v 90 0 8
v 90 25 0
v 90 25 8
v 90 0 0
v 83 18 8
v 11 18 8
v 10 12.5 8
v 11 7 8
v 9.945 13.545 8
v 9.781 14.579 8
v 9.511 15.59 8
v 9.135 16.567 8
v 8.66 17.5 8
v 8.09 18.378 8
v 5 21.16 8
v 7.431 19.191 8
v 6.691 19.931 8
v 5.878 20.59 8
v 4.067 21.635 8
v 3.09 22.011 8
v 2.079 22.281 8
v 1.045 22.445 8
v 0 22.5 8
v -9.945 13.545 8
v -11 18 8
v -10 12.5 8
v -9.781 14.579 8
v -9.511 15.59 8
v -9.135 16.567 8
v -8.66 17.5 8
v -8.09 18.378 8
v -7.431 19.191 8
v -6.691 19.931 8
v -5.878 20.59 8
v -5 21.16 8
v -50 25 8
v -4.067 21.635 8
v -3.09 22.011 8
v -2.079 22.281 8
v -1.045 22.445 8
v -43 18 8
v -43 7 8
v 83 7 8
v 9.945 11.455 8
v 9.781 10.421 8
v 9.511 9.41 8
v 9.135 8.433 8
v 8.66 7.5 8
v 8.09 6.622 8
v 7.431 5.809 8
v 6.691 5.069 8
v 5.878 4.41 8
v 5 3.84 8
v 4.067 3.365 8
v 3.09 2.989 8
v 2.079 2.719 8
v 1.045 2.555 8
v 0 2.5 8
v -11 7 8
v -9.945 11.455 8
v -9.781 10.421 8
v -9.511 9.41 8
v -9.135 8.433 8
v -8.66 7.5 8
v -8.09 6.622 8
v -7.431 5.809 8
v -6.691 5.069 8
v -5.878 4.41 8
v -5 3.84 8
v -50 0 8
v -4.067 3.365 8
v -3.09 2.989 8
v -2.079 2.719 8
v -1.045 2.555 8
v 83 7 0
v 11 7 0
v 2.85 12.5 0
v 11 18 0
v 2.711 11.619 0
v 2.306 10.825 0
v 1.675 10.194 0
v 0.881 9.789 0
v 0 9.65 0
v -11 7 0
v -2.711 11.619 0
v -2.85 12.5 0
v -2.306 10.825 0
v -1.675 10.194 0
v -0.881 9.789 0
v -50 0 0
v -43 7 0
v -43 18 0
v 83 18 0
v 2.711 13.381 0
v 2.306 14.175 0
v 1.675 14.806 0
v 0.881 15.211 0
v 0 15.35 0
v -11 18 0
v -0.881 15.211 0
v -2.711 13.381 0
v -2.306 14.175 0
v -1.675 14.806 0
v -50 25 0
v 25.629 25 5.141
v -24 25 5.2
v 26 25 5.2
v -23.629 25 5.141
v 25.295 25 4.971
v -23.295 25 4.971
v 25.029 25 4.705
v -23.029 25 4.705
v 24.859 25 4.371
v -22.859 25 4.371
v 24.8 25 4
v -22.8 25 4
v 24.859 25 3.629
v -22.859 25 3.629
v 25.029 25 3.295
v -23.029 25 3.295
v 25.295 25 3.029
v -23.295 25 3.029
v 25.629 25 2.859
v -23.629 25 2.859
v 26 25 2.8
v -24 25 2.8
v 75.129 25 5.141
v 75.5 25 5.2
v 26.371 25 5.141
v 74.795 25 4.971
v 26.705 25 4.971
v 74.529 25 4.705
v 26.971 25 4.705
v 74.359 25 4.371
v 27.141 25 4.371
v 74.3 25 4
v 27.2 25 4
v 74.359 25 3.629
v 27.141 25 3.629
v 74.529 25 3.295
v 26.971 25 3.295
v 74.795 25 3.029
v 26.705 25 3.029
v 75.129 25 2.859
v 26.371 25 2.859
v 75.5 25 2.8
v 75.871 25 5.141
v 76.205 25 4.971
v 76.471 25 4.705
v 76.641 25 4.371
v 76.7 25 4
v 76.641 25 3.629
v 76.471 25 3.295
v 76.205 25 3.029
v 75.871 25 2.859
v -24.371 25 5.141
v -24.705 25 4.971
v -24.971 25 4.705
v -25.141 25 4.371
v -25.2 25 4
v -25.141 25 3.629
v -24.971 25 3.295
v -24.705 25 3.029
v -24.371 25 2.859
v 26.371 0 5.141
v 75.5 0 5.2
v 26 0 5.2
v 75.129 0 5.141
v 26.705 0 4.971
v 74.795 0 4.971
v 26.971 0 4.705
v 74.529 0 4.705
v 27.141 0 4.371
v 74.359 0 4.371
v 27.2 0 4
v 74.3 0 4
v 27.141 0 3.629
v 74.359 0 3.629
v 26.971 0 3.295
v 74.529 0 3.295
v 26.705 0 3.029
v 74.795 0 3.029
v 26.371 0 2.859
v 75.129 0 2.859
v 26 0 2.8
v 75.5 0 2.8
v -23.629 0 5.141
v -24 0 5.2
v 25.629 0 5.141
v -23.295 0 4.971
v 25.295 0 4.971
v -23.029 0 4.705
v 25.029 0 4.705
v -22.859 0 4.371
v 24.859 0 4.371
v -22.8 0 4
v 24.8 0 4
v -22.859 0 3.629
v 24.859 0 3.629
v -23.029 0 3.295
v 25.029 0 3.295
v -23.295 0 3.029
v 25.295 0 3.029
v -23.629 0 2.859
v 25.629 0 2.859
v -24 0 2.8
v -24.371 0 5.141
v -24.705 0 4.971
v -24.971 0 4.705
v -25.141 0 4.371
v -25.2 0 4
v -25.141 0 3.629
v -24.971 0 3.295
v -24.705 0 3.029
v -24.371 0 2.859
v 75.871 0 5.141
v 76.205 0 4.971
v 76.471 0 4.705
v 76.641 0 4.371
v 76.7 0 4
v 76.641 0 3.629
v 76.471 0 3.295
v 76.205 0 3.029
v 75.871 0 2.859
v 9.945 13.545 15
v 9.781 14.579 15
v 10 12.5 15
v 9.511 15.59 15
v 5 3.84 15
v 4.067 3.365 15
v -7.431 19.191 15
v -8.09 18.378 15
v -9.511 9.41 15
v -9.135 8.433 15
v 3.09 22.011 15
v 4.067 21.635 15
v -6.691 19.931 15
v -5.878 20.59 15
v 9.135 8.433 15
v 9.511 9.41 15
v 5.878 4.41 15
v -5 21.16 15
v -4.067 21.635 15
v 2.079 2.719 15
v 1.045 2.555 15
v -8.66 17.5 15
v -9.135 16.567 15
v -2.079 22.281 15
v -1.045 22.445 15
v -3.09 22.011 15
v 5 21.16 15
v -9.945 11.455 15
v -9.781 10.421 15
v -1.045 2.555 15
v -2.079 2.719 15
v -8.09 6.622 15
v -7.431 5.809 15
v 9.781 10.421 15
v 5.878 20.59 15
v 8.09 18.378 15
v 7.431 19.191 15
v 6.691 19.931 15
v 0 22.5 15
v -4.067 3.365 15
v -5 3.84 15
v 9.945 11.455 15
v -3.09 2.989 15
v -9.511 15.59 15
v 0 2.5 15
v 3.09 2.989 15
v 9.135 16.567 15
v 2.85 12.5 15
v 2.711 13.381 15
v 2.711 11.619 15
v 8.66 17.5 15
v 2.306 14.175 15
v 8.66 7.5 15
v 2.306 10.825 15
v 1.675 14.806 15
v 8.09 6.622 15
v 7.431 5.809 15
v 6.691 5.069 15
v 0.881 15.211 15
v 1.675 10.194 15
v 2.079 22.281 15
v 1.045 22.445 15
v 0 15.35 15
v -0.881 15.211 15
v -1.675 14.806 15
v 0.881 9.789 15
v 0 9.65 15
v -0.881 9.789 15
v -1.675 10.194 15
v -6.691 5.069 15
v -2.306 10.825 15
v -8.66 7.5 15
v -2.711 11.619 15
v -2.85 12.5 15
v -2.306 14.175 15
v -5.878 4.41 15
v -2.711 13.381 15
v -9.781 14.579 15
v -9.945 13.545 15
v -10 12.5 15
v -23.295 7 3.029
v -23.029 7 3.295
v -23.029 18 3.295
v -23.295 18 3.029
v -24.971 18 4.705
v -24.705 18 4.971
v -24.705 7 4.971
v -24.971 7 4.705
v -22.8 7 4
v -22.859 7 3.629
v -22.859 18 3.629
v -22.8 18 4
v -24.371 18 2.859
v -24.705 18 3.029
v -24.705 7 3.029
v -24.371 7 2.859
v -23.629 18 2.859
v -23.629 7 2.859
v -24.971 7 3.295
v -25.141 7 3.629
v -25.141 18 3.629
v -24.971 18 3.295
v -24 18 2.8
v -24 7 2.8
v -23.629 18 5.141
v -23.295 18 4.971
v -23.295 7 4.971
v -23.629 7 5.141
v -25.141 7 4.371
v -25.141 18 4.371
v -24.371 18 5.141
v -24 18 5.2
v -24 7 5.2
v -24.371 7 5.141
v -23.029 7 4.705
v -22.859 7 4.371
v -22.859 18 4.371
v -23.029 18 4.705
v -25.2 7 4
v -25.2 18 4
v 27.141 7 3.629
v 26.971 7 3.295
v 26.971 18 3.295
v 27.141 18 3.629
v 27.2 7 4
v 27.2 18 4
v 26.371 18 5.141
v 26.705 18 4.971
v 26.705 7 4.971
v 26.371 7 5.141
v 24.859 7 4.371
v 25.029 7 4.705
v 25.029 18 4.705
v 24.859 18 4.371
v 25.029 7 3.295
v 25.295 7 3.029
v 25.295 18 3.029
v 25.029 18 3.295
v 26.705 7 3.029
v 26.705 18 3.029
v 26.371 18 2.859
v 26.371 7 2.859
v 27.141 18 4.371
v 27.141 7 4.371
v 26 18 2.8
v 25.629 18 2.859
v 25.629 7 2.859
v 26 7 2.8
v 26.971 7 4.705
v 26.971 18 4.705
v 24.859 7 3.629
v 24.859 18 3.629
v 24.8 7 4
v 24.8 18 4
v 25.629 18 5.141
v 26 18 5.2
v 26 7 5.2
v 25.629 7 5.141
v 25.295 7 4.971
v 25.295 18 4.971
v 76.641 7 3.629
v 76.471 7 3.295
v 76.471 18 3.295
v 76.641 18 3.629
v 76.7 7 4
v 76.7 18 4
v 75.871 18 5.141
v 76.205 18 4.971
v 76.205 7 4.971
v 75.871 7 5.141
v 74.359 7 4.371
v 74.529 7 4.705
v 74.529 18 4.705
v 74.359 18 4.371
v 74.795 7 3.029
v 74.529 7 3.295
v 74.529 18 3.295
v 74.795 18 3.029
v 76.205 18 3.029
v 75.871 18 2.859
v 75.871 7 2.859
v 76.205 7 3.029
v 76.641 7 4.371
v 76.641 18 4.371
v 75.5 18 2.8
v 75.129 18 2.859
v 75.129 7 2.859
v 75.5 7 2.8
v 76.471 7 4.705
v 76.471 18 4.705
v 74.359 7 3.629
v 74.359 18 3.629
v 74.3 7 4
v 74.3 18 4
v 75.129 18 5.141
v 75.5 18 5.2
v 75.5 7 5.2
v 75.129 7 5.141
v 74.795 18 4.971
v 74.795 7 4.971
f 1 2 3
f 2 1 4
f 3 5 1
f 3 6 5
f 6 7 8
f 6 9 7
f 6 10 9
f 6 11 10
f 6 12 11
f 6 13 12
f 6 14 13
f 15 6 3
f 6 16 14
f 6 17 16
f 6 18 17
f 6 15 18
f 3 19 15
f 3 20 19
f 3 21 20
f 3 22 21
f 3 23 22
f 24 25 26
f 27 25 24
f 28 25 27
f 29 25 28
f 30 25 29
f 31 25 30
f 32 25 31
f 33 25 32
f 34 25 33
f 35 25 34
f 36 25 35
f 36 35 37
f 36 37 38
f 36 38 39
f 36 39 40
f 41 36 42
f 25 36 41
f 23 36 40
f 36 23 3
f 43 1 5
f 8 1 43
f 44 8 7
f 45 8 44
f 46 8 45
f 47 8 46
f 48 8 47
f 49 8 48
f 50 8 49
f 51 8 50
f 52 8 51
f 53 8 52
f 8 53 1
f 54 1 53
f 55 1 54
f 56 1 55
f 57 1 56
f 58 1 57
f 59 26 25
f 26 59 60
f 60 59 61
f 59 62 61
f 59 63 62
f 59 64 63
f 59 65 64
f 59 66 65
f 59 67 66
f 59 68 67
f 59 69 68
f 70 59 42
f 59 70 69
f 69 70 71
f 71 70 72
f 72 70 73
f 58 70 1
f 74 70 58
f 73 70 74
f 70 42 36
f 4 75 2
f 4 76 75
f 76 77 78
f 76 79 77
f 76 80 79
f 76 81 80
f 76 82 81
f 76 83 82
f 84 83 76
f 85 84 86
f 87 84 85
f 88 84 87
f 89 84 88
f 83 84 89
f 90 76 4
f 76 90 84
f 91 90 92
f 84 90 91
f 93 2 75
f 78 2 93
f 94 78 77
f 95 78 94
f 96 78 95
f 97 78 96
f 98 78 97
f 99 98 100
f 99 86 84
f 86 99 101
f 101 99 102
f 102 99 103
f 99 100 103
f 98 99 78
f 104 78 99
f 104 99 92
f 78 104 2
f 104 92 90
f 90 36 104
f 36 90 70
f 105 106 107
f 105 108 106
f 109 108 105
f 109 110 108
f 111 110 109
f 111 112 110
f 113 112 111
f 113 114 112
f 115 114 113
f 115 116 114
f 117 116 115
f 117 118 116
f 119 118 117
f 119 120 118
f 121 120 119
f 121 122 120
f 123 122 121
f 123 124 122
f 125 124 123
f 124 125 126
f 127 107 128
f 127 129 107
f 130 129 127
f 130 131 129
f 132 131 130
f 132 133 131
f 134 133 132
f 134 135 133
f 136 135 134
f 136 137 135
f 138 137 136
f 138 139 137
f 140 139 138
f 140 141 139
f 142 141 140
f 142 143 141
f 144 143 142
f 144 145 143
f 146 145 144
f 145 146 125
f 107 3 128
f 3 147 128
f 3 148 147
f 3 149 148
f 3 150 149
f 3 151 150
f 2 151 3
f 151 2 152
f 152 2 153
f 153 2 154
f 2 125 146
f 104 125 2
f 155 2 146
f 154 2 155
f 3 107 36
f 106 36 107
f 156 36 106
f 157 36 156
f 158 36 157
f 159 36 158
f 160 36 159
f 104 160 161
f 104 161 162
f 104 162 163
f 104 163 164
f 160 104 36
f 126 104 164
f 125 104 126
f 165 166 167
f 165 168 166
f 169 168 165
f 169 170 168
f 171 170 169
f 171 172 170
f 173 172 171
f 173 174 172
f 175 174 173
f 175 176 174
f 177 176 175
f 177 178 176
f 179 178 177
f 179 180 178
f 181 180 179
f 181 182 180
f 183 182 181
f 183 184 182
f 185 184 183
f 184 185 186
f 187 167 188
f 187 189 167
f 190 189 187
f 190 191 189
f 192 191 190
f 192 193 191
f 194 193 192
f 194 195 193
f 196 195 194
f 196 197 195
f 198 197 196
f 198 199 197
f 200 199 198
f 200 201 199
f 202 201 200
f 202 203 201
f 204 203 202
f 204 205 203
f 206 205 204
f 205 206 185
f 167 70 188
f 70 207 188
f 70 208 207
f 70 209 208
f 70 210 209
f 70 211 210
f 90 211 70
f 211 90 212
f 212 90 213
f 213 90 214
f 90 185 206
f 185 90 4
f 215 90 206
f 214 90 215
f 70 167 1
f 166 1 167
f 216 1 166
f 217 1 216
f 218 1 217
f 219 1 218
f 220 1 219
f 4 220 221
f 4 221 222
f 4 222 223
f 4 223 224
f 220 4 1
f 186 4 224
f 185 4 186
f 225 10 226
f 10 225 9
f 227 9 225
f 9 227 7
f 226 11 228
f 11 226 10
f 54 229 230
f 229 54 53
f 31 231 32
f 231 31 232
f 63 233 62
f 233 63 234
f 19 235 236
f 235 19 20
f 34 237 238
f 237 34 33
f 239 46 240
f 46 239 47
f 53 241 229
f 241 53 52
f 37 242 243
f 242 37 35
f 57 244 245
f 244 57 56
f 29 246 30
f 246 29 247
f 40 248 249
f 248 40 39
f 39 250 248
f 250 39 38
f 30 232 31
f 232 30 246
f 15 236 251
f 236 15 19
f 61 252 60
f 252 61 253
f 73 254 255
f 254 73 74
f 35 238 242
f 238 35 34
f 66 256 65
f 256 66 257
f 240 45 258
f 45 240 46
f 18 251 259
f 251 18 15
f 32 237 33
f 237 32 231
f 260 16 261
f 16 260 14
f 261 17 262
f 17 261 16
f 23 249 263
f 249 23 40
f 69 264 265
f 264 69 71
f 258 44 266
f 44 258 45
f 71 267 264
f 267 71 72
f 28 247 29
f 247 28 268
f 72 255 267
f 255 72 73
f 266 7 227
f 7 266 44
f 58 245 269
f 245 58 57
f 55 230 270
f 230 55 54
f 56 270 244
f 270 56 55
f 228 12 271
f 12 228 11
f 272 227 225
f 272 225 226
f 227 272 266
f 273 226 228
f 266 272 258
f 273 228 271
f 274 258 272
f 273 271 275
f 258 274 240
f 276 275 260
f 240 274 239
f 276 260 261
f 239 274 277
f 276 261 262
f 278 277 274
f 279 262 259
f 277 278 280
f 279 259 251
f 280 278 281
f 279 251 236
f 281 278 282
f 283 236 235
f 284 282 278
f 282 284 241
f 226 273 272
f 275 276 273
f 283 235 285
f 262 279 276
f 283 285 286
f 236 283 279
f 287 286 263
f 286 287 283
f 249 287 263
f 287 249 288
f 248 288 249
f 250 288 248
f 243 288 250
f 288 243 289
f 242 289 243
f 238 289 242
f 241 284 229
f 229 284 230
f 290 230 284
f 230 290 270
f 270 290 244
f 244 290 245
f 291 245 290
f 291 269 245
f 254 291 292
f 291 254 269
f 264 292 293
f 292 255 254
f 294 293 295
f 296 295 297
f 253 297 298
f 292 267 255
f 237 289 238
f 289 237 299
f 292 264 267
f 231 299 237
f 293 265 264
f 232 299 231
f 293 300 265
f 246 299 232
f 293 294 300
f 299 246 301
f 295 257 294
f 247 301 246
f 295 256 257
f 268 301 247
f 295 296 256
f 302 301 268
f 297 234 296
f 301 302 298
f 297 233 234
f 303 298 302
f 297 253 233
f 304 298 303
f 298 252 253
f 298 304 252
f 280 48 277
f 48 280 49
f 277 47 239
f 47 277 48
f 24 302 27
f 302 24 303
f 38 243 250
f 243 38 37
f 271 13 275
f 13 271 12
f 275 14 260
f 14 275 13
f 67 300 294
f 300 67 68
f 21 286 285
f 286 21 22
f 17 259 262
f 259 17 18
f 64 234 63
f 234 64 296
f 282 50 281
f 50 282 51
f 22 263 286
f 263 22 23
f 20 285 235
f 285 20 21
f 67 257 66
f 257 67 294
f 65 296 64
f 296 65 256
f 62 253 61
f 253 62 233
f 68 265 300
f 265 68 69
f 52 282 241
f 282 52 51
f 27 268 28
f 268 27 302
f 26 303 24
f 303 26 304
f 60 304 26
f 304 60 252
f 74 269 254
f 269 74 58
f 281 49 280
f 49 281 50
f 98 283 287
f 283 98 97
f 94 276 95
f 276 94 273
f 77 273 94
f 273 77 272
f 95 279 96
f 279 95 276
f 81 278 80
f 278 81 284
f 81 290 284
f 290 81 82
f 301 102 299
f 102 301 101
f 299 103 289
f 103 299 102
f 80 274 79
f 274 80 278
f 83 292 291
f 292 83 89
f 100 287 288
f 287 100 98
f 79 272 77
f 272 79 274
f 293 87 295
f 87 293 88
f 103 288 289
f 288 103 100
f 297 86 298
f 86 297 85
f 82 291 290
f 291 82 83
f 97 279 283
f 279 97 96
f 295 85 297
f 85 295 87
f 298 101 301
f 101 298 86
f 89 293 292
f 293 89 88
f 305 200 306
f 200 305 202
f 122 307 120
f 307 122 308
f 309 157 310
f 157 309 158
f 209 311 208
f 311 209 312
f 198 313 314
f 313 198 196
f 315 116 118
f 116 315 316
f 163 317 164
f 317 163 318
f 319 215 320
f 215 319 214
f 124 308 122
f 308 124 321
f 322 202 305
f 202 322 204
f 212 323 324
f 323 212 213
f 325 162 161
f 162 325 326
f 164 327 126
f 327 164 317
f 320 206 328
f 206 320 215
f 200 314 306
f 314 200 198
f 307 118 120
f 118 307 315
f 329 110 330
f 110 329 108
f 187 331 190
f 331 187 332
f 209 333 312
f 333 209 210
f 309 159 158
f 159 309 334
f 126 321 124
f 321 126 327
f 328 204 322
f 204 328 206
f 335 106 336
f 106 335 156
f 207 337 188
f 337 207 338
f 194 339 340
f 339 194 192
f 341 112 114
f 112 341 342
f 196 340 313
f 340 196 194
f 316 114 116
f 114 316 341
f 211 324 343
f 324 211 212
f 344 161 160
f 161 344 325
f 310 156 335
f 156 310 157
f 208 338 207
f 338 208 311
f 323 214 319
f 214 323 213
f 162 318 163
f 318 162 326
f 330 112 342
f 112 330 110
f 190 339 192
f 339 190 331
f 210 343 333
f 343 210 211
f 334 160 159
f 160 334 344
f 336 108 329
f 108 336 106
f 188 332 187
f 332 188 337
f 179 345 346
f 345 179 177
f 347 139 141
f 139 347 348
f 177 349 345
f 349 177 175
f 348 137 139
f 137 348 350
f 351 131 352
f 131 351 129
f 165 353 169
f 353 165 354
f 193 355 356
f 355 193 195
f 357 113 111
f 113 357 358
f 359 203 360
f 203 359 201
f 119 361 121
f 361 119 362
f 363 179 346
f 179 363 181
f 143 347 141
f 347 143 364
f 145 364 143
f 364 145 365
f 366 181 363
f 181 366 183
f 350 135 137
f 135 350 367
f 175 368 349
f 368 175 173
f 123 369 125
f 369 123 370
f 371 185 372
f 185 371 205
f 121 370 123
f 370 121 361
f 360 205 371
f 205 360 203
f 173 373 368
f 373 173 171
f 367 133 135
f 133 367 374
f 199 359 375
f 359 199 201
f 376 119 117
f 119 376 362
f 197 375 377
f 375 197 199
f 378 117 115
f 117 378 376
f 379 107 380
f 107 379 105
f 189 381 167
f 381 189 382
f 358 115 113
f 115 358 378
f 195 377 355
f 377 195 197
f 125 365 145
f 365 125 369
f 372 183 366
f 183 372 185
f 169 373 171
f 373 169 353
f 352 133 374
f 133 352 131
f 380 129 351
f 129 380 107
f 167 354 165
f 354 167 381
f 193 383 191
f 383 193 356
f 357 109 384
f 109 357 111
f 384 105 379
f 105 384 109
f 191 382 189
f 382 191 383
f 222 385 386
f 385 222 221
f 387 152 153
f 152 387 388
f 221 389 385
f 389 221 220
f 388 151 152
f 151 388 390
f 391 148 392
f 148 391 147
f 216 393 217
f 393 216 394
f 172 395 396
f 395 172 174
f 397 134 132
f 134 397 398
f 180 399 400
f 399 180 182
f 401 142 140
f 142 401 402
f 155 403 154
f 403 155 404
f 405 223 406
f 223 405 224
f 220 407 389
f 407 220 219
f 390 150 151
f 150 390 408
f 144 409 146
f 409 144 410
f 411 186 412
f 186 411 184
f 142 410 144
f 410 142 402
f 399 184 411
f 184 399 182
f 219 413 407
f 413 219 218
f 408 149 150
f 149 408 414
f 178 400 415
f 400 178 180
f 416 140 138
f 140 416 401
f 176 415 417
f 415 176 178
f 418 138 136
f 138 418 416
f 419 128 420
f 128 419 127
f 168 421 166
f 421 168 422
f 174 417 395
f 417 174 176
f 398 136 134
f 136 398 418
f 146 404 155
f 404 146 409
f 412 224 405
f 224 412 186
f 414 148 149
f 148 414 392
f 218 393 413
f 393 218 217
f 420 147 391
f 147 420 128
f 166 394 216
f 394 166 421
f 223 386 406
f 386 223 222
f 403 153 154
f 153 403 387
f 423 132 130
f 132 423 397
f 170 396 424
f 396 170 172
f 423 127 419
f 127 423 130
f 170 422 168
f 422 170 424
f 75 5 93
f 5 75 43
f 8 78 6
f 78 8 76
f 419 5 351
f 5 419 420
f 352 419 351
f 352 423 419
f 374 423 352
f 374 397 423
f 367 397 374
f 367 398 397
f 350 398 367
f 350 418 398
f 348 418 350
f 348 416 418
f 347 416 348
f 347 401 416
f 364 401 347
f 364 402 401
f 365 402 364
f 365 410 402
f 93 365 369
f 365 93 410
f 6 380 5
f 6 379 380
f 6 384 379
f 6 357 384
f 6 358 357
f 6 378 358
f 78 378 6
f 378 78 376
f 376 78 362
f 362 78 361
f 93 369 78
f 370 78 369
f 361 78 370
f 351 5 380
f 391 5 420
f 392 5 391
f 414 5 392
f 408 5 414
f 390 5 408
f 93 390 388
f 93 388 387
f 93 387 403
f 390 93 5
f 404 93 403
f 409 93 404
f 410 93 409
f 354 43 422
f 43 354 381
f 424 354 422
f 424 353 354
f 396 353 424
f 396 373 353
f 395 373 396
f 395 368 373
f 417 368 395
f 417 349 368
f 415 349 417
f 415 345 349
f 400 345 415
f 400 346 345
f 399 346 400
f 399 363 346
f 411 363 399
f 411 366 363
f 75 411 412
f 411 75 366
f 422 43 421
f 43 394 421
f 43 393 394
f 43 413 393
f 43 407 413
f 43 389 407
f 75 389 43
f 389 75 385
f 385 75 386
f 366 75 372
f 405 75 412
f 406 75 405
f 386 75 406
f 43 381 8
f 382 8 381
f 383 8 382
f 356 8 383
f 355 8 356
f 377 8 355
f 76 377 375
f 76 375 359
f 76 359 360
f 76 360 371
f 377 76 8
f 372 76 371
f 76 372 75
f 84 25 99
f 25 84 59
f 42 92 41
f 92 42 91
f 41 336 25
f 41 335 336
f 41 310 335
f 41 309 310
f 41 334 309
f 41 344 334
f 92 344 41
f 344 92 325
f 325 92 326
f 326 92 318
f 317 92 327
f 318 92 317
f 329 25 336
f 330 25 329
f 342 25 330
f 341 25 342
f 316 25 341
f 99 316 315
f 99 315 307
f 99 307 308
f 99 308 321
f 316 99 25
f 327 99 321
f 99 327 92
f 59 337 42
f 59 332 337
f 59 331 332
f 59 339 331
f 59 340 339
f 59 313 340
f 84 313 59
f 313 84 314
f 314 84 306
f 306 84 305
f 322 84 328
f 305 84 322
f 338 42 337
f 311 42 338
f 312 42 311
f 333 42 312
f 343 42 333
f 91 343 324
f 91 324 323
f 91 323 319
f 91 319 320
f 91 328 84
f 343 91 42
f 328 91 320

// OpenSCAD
//borrar
difference(){
union(){
translate([-50,0,0])cube([140,25,8]);
translate([0,12.5,0])cylinder(d=20,h=15,$fn=60);
}    
translate([0,12.5,0])cylinder(d=5.7,h=15,$fn=20);
translate([-24,-1,4])rotate([-90,0,0])
    cylinder(d=2.4,h=50,$fn=20);
translate([26,-1,4])rotate([-90,0,0])
    cylinder(d=2.4,h=50,$fn=20);
translate([75.5,-1,4])rotate([-90,0,0])
    cylinder(d=2.4,h=50,$fn=20);
translate([11,7,-1])cube([72,11,12]);
translate([-43,7,-1])cube([32,11,12]);
}
